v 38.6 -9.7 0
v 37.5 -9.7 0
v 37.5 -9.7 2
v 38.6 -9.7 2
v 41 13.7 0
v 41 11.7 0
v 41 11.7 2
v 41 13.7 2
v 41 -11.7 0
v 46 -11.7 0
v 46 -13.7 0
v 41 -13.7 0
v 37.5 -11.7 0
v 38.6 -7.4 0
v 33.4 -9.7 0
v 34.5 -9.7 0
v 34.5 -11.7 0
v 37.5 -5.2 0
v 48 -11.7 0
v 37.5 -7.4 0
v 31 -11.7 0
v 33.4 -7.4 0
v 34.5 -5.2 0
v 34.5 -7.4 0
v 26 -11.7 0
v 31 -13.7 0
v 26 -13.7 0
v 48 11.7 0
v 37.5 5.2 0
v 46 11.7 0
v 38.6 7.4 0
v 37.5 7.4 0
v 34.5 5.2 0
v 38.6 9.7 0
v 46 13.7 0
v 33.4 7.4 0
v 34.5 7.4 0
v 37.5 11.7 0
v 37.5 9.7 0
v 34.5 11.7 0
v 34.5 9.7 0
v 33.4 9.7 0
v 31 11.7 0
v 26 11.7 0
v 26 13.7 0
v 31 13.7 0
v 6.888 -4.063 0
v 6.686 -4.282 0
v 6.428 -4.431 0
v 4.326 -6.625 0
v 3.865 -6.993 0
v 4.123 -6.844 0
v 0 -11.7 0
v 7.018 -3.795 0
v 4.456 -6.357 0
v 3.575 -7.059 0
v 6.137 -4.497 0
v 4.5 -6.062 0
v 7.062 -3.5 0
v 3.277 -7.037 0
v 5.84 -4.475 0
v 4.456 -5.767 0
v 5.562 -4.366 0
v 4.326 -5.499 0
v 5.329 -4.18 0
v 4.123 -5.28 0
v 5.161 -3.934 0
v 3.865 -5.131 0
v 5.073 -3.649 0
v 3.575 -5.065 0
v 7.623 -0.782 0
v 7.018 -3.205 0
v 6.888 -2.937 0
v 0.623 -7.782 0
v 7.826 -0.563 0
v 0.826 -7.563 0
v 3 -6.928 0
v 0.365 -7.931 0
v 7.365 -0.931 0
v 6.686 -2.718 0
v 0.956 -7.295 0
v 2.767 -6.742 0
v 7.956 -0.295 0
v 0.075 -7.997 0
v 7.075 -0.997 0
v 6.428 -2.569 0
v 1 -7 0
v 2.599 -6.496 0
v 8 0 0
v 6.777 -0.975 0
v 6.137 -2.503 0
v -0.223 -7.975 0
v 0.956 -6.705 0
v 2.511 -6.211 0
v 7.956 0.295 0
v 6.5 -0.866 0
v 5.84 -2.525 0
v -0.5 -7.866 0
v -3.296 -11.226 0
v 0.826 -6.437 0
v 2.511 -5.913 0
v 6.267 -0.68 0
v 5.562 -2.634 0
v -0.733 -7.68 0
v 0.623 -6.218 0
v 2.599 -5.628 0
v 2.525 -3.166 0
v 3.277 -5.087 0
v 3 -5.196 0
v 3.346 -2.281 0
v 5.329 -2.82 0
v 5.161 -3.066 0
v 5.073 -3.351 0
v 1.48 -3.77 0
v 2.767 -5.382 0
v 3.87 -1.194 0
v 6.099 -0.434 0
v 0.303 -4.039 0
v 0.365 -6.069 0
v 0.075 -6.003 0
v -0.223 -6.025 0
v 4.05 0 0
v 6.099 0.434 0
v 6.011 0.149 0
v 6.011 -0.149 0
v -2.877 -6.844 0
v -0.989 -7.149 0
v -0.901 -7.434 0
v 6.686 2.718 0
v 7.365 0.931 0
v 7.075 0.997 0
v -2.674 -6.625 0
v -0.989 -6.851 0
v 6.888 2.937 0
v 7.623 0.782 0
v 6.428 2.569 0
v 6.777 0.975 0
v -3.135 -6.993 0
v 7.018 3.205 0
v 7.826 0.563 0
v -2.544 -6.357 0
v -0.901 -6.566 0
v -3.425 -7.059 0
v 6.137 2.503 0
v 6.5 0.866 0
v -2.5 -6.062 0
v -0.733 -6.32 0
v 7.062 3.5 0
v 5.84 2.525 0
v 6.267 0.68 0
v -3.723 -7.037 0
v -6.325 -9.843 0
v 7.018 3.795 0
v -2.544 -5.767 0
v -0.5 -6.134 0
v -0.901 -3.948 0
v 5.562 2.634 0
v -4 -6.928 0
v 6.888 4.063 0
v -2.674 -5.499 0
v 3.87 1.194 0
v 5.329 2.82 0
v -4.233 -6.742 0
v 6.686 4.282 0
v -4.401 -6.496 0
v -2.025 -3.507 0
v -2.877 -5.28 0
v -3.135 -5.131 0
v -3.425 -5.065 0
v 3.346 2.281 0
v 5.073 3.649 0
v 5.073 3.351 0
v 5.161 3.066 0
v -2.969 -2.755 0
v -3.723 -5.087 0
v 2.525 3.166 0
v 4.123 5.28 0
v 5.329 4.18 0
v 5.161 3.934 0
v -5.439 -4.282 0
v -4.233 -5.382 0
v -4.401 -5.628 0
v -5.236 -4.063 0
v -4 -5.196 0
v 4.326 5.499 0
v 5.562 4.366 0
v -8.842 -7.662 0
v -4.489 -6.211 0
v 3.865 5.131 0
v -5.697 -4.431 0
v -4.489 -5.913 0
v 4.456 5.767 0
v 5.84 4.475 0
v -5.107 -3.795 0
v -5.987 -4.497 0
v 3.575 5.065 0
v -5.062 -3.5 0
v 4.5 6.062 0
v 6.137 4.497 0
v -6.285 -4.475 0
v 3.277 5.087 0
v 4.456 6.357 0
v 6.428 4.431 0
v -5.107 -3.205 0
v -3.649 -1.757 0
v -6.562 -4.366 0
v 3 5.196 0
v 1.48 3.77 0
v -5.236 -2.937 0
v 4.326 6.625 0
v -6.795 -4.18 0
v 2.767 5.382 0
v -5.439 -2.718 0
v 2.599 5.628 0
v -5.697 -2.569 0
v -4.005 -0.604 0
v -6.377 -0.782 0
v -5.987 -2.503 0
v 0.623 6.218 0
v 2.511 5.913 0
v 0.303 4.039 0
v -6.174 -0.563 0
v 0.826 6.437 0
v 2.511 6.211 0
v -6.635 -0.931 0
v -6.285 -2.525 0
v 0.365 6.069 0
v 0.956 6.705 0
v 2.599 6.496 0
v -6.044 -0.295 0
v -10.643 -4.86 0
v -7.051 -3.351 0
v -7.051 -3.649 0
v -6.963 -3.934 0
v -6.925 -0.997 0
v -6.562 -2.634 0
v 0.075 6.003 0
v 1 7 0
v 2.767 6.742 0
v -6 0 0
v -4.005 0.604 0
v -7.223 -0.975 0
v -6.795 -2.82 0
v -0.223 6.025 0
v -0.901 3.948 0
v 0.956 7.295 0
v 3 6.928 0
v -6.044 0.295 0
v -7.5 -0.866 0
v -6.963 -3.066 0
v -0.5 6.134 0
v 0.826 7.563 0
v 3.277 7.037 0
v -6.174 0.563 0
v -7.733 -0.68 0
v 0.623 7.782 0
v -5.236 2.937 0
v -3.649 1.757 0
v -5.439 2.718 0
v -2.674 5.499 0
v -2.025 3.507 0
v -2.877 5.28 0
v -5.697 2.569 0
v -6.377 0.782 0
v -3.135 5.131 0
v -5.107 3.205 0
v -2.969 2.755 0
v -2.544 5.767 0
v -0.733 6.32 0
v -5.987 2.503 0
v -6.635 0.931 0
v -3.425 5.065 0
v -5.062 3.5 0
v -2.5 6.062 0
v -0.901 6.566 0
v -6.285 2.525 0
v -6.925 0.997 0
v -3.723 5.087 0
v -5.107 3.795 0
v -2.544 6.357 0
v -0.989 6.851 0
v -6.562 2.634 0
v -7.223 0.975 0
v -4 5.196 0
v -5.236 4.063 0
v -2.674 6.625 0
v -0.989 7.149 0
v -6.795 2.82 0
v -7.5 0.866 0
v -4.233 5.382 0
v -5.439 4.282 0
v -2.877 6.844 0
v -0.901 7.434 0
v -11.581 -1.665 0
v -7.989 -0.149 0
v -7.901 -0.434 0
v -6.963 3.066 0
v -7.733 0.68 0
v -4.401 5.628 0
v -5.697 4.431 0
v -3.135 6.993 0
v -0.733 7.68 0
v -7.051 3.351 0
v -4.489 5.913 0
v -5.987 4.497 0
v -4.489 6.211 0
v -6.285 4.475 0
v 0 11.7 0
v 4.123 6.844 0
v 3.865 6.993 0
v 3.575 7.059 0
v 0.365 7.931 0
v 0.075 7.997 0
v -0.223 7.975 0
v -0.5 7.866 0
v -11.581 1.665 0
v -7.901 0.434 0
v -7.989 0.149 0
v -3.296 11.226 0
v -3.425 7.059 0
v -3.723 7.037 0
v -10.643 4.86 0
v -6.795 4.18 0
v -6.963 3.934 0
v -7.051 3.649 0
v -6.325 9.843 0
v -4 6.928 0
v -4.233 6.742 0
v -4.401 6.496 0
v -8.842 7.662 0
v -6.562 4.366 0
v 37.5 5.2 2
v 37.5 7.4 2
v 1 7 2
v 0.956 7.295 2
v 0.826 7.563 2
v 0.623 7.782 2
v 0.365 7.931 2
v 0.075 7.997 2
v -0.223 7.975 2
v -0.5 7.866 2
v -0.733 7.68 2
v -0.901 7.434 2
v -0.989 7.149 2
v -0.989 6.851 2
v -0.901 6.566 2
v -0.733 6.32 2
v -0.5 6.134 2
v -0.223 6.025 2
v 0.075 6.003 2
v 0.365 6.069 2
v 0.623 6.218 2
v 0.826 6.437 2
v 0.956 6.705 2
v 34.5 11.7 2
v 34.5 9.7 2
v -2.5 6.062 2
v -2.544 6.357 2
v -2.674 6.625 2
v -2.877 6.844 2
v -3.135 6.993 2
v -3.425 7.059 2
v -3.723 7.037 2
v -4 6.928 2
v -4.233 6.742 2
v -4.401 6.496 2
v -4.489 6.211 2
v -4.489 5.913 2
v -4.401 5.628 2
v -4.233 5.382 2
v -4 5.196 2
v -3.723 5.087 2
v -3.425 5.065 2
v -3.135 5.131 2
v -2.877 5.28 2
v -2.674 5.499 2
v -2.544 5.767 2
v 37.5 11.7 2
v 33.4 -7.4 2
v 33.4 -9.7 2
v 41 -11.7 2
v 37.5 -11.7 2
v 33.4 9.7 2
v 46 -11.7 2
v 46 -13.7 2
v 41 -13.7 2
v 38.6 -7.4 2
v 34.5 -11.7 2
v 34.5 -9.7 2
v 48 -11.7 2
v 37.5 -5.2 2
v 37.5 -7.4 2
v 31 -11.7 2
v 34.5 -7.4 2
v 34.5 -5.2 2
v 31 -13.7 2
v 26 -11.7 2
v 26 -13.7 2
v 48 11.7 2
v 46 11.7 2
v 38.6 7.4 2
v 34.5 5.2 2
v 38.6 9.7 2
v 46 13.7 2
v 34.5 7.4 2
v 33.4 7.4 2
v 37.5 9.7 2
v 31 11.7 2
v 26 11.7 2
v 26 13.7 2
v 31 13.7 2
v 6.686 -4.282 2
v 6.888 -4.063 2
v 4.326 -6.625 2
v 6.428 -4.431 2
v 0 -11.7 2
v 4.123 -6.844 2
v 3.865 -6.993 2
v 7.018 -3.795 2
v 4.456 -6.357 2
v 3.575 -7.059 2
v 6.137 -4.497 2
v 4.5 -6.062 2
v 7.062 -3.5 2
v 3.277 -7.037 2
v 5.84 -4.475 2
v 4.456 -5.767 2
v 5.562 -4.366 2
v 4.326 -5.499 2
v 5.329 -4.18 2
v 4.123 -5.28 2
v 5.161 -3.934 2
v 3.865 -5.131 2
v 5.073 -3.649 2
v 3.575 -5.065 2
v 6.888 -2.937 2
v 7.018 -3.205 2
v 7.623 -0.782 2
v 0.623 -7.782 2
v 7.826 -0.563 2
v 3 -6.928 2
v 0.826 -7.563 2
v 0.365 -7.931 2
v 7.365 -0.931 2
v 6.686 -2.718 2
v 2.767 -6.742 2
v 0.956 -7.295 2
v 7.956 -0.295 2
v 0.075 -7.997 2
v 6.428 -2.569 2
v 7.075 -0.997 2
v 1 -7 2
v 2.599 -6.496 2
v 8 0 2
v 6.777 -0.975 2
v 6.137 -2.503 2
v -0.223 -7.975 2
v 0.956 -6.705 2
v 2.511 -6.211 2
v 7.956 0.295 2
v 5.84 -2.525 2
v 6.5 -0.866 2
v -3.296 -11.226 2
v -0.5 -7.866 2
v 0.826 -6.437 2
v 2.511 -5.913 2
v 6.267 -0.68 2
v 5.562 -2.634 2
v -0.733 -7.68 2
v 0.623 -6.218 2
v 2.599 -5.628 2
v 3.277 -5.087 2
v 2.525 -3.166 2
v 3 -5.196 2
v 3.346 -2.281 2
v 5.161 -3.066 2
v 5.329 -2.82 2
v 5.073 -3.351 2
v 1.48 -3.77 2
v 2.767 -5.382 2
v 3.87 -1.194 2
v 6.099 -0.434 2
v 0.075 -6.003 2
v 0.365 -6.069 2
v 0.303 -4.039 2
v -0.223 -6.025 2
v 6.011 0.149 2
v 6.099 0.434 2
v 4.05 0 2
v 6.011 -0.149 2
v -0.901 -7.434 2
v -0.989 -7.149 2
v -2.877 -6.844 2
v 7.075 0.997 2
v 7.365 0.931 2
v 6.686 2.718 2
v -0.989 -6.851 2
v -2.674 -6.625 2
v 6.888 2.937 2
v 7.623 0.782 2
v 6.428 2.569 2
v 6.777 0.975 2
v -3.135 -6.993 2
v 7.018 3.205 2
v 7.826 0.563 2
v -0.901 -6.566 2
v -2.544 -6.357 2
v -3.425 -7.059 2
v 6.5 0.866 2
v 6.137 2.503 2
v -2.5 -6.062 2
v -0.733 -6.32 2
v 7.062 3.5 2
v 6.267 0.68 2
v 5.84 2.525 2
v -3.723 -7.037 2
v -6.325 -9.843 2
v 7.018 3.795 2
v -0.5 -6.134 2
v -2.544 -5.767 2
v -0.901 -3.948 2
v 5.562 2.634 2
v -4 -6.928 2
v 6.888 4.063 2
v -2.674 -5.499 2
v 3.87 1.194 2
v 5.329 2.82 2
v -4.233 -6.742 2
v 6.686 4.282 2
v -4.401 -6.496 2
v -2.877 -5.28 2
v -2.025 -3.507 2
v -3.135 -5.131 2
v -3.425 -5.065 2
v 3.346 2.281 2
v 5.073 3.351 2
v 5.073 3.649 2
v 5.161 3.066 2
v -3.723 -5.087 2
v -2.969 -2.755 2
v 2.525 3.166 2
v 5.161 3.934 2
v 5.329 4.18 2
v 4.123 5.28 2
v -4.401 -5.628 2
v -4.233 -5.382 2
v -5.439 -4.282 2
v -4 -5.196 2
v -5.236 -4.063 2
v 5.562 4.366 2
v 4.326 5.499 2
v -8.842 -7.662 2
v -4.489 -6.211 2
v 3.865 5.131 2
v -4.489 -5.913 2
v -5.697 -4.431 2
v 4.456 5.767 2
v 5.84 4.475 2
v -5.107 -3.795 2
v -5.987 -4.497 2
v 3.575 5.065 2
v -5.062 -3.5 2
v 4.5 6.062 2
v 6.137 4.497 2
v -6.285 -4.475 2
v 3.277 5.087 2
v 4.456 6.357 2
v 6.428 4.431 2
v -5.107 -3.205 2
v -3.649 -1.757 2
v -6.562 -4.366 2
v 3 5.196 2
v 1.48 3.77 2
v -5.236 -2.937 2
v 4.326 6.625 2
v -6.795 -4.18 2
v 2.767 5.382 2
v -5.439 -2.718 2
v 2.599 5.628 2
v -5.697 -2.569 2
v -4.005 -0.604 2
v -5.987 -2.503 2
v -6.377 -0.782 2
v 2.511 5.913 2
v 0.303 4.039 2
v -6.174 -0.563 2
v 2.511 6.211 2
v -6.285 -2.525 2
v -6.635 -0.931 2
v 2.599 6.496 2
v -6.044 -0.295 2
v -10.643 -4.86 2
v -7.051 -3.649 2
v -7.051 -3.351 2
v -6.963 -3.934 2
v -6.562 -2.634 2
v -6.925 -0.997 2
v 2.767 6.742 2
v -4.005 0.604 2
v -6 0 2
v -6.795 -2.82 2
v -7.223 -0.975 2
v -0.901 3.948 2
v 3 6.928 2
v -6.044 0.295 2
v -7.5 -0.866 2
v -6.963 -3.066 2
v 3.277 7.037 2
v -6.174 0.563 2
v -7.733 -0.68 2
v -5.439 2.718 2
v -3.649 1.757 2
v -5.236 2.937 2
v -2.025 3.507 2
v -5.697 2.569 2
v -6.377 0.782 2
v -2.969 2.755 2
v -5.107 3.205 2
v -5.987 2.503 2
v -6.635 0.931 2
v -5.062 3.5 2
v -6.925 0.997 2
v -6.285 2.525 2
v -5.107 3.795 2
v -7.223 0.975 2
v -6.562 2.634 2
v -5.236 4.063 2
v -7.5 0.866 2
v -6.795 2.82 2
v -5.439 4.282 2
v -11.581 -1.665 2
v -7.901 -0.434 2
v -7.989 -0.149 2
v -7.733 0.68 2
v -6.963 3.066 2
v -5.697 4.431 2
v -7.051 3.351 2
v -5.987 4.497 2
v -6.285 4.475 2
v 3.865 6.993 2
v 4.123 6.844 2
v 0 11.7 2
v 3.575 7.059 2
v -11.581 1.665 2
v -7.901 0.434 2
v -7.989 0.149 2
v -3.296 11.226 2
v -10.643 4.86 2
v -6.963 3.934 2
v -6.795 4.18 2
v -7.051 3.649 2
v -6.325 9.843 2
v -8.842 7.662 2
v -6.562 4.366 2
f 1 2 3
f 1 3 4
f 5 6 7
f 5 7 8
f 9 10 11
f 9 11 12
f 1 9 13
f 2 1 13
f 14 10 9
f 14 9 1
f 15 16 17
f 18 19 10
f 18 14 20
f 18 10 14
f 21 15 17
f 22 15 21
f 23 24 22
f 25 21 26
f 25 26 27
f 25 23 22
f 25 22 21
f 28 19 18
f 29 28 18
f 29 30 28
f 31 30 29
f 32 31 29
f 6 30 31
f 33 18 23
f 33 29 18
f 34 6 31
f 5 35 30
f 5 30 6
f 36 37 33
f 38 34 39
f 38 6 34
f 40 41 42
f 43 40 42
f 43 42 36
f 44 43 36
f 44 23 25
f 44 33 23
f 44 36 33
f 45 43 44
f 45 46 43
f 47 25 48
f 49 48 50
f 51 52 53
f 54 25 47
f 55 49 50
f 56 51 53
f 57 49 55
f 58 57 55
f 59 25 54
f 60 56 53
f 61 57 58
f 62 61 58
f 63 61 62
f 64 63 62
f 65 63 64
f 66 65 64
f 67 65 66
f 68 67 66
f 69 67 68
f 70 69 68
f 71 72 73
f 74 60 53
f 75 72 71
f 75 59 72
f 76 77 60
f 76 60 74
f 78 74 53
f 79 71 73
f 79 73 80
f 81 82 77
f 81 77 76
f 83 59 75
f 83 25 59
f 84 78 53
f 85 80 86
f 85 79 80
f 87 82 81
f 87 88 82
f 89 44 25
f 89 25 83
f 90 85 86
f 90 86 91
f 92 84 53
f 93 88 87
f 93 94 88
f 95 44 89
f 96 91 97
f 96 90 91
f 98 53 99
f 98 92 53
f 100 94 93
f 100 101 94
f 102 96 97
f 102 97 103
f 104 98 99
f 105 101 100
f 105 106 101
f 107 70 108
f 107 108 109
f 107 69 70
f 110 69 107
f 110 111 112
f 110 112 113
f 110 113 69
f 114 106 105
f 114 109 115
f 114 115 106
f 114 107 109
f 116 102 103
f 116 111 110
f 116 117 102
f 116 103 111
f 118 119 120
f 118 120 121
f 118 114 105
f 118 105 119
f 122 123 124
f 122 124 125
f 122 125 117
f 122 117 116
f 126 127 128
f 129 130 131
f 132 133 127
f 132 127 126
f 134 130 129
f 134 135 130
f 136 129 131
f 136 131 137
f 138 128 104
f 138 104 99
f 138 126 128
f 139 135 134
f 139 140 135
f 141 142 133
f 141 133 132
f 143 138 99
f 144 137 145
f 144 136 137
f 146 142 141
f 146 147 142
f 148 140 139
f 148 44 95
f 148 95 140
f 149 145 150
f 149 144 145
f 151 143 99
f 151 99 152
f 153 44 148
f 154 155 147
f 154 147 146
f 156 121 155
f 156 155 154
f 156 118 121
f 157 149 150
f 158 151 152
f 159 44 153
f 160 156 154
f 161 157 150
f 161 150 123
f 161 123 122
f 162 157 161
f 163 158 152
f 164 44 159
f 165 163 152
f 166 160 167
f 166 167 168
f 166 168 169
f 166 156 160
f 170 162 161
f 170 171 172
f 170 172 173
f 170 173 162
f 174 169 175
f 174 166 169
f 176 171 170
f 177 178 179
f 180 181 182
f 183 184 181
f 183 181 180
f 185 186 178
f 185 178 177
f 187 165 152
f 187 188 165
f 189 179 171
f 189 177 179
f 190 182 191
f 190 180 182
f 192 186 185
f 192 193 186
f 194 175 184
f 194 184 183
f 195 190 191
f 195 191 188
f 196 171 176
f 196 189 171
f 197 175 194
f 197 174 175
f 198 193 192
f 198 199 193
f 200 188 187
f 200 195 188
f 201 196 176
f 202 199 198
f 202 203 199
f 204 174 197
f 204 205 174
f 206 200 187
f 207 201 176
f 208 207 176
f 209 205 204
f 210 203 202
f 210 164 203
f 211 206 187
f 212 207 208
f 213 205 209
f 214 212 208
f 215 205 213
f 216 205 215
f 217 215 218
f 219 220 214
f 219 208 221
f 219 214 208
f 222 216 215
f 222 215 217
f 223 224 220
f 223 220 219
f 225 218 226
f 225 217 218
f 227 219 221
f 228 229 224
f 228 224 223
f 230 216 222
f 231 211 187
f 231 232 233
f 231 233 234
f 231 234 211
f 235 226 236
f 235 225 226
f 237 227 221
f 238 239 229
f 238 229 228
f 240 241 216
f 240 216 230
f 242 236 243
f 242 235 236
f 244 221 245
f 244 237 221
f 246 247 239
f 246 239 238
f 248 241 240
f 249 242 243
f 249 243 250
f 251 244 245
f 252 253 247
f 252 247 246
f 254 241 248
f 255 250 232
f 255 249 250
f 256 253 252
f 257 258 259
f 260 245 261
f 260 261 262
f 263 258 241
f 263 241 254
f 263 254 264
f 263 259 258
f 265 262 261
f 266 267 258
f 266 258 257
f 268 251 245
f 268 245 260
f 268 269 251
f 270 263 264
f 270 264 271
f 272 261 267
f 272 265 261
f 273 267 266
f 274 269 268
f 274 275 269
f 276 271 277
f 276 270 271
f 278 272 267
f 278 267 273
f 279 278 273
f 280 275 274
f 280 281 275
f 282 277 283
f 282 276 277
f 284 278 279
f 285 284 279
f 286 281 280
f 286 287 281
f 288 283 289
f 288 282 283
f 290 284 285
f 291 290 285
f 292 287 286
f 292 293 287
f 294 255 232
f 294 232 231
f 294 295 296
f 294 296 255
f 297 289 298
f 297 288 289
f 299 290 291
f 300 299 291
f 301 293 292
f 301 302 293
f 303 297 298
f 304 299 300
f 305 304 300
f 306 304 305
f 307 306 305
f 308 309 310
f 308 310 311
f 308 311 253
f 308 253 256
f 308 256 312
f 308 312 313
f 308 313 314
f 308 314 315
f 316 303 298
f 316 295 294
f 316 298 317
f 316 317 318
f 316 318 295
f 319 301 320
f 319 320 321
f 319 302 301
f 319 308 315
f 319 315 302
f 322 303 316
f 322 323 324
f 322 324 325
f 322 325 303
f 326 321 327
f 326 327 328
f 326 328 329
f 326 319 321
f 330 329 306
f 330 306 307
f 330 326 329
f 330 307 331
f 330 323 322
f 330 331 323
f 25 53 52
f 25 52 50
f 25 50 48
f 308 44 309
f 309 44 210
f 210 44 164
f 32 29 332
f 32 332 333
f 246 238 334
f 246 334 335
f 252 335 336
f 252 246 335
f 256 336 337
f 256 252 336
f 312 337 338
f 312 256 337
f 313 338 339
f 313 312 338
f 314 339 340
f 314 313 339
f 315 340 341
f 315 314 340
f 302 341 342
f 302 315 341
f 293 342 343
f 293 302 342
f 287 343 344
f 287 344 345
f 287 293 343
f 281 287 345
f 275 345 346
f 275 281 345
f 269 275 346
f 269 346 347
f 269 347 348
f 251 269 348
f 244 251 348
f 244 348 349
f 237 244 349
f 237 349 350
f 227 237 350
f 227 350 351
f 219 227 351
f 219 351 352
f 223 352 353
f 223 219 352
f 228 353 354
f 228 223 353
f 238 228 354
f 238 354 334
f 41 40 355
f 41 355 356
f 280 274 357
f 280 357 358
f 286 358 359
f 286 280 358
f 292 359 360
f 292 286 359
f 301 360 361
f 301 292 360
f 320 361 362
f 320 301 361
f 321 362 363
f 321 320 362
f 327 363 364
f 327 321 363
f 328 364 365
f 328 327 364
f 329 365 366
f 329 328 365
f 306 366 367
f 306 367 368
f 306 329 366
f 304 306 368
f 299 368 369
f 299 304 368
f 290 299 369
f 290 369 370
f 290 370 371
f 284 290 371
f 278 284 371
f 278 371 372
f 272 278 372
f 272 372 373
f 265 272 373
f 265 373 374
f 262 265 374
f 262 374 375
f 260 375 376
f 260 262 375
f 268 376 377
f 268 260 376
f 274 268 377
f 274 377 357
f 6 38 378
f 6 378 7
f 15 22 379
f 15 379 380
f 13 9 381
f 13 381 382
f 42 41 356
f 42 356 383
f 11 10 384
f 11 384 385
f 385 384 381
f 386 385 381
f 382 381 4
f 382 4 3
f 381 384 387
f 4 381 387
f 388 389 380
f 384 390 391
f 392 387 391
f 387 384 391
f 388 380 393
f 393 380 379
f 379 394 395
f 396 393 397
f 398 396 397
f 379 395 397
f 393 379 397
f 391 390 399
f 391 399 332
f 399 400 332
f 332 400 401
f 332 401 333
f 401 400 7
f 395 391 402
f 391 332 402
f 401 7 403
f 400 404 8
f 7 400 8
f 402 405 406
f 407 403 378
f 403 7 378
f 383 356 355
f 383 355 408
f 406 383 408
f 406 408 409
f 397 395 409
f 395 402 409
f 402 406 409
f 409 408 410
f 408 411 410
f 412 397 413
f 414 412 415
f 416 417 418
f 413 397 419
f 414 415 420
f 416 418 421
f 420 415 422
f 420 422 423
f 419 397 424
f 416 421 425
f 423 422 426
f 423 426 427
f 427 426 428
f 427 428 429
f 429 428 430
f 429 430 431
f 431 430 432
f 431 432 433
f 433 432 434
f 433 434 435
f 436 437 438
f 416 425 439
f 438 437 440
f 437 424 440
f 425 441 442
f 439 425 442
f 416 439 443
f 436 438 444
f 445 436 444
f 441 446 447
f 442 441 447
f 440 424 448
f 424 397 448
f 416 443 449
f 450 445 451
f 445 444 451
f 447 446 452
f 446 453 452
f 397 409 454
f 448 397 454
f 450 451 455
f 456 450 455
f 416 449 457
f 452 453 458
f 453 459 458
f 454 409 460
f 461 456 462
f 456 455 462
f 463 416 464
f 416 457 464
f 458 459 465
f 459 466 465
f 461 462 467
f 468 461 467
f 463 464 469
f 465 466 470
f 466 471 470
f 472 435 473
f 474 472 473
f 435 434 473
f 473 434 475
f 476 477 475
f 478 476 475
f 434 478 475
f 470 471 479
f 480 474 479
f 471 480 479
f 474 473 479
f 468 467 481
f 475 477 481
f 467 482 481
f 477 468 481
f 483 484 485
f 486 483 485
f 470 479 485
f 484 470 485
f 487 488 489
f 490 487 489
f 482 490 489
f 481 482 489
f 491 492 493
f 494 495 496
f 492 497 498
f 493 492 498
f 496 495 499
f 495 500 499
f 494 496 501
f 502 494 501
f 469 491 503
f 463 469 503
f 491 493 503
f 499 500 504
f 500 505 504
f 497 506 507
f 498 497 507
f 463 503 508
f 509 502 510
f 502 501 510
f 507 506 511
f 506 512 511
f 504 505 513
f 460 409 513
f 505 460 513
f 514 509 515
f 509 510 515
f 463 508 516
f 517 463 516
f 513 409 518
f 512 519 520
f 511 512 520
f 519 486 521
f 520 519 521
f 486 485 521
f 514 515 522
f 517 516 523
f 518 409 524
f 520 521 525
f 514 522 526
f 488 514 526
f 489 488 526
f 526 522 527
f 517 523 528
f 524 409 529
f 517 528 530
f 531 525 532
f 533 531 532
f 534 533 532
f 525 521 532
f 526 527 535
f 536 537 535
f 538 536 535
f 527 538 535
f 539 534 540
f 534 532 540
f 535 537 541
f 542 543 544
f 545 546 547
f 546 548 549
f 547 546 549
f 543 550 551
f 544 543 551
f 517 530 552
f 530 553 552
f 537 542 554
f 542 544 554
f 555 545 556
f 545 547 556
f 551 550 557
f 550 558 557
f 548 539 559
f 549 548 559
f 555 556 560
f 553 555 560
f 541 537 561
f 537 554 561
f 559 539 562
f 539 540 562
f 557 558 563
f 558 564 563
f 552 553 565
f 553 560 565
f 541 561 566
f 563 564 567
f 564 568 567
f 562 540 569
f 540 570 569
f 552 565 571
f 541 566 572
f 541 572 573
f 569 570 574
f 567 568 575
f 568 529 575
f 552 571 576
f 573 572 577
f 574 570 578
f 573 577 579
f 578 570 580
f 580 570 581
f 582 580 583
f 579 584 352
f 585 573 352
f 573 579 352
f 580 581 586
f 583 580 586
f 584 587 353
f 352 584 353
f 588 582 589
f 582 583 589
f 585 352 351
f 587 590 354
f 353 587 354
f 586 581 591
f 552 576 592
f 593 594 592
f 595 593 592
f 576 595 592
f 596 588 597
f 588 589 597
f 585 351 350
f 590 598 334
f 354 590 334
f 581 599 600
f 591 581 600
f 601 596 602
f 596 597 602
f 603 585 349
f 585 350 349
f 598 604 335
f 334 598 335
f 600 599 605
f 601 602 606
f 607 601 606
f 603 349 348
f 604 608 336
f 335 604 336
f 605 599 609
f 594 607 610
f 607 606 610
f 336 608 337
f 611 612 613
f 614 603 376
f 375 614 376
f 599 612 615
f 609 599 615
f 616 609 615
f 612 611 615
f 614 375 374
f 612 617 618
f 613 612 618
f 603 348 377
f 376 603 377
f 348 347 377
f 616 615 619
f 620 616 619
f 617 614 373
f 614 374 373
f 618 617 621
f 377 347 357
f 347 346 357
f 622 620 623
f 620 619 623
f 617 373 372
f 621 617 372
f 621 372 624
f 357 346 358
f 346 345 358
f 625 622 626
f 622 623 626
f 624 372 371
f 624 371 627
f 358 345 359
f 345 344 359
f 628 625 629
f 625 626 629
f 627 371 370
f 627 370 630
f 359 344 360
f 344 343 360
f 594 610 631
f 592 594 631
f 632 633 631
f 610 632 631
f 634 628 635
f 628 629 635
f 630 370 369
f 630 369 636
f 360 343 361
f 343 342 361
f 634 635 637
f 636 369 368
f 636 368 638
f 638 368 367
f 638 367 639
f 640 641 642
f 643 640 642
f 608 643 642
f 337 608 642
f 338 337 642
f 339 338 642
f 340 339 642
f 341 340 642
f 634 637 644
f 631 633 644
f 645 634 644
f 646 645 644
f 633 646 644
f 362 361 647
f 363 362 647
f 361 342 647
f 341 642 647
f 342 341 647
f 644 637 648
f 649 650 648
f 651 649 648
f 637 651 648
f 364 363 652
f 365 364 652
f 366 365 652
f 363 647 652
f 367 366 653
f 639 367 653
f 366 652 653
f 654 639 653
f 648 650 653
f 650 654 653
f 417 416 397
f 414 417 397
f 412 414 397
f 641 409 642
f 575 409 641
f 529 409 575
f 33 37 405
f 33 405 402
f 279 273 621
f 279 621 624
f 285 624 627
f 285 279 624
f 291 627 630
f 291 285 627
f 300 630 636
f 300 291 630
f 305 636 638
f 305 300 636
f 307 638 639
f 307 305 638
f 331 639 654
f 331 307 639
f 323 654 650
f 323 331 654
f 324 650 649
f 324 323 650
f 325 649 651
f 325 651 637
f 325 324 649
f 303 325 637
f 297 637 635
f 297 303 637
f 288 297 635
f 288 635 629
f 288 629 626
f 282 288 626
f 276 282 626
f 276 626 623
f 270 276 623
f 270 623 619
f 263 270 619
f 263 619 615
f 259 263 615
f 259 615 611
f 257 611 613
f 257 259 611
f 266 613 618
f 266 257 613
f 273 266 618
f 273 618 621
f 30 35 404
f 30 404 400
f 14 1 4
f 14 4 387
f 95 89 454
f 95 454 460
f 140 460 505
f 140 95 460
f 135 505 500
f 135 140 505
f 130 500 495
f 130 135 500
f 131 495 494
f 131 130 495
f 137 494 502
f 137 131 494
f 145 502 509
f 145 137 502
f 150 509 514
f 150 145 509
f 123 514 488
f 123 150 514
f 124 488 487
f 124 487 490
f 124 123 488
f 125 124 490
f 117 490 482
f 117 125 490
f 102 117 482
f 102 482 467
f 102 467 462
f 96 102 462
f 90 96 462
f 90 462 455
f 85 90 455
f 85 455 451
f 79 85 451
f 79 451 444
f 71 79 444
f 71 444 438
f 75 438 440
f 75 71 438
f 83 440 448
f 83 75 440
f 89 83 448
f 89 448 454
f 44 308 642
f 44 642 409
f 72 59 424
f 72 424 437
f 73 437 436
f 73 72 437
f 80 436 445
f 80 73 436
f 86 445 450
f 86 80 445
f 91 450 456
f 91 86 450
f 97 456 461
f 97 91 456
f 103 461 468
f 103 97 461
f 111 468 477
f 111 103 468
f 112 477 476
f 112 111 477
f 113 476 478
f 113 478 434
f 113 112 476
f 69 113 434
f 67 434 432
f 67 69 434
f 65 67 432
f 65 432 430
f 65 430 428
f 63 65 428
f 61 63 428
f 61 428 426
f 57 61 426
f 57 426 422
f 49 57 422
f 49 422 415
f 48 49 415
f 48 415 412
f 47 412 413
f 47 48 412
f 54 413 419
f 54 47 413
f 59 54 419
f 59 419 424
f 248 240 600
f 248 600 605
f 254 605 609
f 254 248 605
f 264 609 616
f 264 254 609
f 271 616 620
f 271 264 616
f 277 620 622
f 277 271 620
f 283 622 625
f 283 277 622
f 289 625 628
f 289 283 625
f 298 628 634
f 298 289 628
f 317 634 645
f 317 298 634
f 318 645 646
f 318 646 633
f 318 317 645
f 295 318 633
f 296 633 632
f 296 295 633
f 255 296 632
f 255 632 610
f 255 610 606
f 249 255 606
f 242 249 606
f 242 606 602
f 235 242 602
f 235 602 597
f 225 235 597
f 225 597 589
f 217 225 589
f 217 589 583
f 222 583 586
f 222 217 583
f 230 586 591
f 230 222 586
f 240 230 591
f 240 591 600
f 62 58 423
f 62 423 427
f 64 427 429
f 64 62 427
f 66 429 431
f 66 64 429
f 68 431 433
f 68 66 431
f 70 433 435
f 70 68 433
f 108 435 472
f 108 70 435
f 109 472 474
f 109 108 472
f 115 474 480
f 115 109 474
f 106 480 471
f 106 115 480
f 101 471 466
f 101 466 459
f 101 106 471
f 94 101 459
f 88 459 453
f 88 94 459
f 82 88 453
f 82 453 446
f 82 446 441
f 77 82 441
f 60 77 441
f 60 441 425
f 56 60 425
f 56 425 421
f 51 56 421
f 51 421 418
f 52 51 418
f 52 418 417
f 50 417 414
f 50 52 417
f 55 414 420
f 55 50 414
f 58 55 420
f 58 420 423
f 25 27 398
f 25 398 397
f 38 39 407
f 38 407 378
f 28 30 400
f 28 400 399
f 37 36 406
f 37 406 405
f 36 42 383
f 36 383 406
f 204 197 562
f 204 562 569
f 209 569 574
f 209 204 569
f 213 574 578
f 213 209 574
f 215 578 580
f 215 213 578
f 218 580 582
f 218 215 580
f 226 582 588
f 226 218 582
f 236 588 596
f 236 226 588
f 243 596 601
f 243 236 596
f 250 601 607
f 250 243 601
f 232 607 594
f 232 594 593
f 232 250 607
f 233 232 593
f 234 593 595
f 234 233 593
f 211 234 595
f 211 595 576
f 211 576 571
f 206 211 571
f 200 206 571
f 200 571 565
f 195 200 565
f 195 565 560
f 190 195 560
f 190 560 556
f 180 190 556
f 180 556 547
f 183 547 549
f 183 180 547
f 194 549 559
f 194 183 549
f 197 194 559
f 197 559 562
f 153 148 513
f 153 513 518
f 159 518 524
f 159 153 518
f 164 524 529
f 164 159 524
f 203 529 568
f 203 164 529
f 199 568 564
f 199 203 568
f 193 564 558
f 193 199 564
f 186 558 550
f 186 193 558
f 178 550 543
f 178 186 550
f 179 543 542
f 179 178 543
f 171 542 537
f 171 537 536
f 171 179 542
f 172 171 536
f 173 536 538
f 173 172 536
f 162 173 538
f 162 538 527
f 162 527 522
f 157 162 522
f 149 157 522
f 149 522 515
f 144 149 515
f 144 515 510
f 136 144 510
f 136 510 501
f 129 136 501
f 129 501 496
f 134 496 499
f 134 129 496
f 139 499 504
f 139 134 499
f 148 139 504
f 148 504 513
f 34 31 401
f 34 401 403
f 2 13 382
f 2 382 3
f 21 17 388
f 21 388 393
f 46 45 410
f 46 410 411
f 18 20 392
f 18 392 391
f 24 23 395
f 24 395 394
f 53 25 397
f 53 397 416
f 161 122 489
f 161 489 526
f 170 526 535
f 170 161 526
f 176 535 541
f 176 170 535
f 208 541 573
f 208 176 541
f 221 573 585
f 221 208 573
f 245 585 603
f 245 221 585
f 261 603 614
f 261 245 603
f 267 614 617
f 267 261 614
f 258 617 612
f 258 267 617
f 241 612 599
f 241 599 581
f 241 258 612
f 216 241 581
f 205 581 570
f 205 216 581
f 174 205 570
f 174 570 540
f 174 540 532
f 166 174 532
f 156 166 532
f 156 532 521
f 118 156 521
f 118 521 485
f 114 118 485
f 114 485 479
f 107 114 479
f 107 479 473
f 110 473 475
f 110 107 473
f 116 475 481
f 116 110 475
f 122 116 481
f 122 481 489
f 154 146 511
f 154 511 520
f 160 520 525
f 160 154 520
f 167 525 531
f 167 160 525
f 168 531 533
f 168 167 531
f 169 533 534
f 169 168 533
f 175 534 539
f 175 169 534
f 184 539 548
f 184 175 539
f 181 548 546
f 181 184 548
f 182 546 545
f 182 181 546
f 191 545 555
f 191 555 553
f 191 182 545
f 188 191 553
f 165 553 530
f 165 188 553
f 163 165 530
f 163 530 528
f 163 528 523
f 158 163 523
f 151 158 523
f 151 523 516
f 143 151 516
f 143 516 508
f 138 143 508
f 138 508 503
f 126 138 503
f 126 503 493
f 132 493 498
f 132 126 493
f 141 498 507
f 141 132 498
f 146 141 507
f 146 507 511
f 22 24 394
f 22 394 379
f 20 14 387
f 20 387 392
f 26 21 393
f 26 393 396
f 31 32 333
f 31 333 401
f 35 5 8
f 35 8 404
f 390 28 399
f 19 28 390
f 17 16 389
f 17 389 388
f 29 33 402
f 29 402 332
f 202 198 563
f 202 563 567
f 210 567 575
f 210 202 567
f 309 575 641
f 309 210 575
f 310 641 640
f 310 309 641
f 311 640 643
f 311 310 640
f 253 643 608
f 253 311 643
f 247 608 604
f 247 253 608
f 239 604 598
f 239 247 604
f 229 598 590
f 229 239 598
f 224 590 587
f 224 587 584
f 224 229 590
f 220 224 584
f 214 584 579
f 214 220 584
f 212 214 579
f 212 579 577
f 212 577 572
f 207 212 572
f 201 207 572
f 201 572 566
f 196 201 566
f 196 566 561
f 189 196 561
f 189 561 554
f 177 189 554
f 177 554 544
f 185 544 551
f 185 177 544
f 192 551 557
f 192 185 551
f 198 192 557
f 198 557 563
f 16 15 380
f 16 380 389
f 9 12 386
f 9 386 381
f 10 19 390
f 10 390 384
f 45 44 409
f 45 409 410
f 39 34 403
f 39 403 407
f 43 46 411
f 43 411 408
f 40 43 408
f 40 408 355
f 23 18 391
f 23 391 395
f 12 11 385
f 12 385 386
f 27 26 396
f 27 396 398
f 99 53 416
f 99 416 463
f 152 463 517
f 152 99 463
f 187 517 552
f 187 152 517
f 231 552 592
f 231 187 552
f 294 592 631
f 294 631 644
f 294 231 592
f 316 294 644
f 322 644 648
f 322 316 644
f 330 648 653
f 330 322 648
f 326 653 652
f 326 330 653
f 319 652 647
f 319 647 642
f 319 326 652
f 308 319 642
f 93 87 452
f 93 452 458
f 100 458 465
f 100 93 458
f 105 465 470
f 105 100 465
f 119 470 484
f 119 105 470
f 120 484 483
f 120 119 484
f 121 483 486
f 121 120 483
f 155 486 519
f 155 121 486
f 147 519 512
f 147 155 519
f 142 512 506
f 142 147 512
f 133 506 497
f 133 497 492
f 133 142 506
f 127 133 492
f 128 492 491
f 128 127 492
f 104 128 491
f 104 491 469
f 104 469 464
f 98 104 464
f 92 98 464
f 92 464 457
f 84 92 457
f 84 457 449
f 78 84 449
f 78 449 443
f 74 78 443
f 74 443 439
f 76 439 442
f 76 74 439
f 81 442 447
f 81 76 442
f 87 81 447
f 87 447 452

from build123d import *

# Parameters (mm, degrees)
SKETCH1_R           = 4.05
SKETCH1_R_2         = 1
BOSS_EXTRUDE1_DEPTH = 2


with BuildPart() as part:
    # Sketch1 → Boss-Extrude1 (new body)
    with BuildSketch(Plane.XY):
        with BuildLine():
            Line((48, 11.7), (48, -11.7))
            Line((48, -11.7), (46, -11.7))
            Line((46, -11.7), (46, -13.7))
            Line((46, -13.7), (41, -13.7))
            Line((41, -13.7), (41, -11.7))
            Line((41, -11.7), (37.5, -11.7))
            Line((37.5, -11.7), (37.5, -9.7))
            Line((37.5, -9.7), (38.6, -9.7))
            Line((38.6, -9.7), (38.6, -7.4))
            Line((38.6, -7.4), (37.5, -7.4))
            Line((37.5, -7.4), (37.5, -5.2))
            Line((37.5, -5.2), (34.5, -5.2))
            Line((34.5, -5.2), (34.5, -7.4))
            Line((34.5, -7.4), (33.4, -7.4))
            Line((33.4, -7.4), (33.4, -9.7))
            Line((33.4, -9.7), (34.5, -9.7))
            Line((34.5, -9.7), (34.5, -11.7))
            Line((34.5, -11.7), (31, -11.7))
            Line((31, -11.7), (31, -13.7))
            Line((31, -13.7), (26, -13.7))
            Line((26, -13.7), (26, -11.7))
            Line((26, -11.7), (0, -11.7))
            ThreePointArc((0, -11.7), (-11.7, 0), (0, 11.7))
            Line((0, 11.7), (26, 11.7))
            Line((26, 11.7), (26, 13.7))
            Line((26, 13.7), (31, 13.7))
            Line((31, 13.7), (31, 11.7))
            Line((31, 11.7), (34.5, 11.7))
            Line((34.5, 11.7), (34.5, 9.7))
            Line((34.5, 9.7), (33.4, 9.7))
            Line((33.4, 9.7), (33.4, 7.4))
            Line((33.4, 7.4), (34.5, 7.4))
            Line((34.5, 7.4), (34.5, 5.2))
            Line((34.5, 5.2), (37.5, 5.2))
            Line((37.5, 5.2), (37.5, 7.4))
            Line((37.5, 7.4), (38.6, 7.4))
            Line((38.6, 7.4), (38.6, 9.7))
            Line((38.6, 9.7), (37.5, 9.7))
            Line((37.5, 9.7), (37.5, 11.7))
            Line((37.5, 11.7), (41, 11.7))
            Line((41, 11.7), (41, 13.7))
            Line((41, 13.7), (46, 13.7))
            Line((46, 13.7), (46, 11.7))
            Line((46, 11.7), (48, 11.7))
        make_face()
        Circle(SKETCH1_R, mode=Mode.SUBTRACT)
        with Locations((7, 0)):
            Circle(SKETCH1_R_2, mode=Mode.SUBTRACT)
        with Locations((6.062177826, -3.5)):
            Circle(SKETCH1_R_2, mode=Mode.SUBTRACT)
        with Locations((3.5, -6.062177826)):
            Circle(SKETCH1_R_2, mode=Mode.SUBTRACT)
        with Locations((0, -7)):
            Circle(SKETCH1_R_2, mode=Mode.SUBTRACT)
        with Locations((-3.5, -6.062177826)):
            Circle(SKETCH1_R_2, mode=Mode.SUBTRACT)
        with Locations((-6.062177826, -3.5)):
            Circle(SKETCH1_R_2, mode=Mode.SUBTRACT)
        with Locations((-7, 0)):
            Circle(SKETCH1_R_2, mode=Mode.SUBTRACT)
        with Locations((-6.062177826, 3.5)):
            Circle(SKETCH1_R_2, mode=Mode.SUBTRACT)
        with Locations((-3.5, 6.062177826)):
            Circle(SKETCH1_R_2, mode=Mode.SUBTRACT)
        with Locations((0, 7)):
            Circle(SKETCH1_R_2, mode=Mode.SUBTRACT)
        with Locations((3.5, 6.062177826)):
            Circle(SKETCH1_R_2, mode=Mode.SUBTRACT)
        with Locations((6.062177826, 3.5)):
            Circle(SKETCH1_R_2, mode=Mode.SUBTRACT)
    extrude(amount=BOSS_EXTRUDE1_DEPTH)


solid = part.part
